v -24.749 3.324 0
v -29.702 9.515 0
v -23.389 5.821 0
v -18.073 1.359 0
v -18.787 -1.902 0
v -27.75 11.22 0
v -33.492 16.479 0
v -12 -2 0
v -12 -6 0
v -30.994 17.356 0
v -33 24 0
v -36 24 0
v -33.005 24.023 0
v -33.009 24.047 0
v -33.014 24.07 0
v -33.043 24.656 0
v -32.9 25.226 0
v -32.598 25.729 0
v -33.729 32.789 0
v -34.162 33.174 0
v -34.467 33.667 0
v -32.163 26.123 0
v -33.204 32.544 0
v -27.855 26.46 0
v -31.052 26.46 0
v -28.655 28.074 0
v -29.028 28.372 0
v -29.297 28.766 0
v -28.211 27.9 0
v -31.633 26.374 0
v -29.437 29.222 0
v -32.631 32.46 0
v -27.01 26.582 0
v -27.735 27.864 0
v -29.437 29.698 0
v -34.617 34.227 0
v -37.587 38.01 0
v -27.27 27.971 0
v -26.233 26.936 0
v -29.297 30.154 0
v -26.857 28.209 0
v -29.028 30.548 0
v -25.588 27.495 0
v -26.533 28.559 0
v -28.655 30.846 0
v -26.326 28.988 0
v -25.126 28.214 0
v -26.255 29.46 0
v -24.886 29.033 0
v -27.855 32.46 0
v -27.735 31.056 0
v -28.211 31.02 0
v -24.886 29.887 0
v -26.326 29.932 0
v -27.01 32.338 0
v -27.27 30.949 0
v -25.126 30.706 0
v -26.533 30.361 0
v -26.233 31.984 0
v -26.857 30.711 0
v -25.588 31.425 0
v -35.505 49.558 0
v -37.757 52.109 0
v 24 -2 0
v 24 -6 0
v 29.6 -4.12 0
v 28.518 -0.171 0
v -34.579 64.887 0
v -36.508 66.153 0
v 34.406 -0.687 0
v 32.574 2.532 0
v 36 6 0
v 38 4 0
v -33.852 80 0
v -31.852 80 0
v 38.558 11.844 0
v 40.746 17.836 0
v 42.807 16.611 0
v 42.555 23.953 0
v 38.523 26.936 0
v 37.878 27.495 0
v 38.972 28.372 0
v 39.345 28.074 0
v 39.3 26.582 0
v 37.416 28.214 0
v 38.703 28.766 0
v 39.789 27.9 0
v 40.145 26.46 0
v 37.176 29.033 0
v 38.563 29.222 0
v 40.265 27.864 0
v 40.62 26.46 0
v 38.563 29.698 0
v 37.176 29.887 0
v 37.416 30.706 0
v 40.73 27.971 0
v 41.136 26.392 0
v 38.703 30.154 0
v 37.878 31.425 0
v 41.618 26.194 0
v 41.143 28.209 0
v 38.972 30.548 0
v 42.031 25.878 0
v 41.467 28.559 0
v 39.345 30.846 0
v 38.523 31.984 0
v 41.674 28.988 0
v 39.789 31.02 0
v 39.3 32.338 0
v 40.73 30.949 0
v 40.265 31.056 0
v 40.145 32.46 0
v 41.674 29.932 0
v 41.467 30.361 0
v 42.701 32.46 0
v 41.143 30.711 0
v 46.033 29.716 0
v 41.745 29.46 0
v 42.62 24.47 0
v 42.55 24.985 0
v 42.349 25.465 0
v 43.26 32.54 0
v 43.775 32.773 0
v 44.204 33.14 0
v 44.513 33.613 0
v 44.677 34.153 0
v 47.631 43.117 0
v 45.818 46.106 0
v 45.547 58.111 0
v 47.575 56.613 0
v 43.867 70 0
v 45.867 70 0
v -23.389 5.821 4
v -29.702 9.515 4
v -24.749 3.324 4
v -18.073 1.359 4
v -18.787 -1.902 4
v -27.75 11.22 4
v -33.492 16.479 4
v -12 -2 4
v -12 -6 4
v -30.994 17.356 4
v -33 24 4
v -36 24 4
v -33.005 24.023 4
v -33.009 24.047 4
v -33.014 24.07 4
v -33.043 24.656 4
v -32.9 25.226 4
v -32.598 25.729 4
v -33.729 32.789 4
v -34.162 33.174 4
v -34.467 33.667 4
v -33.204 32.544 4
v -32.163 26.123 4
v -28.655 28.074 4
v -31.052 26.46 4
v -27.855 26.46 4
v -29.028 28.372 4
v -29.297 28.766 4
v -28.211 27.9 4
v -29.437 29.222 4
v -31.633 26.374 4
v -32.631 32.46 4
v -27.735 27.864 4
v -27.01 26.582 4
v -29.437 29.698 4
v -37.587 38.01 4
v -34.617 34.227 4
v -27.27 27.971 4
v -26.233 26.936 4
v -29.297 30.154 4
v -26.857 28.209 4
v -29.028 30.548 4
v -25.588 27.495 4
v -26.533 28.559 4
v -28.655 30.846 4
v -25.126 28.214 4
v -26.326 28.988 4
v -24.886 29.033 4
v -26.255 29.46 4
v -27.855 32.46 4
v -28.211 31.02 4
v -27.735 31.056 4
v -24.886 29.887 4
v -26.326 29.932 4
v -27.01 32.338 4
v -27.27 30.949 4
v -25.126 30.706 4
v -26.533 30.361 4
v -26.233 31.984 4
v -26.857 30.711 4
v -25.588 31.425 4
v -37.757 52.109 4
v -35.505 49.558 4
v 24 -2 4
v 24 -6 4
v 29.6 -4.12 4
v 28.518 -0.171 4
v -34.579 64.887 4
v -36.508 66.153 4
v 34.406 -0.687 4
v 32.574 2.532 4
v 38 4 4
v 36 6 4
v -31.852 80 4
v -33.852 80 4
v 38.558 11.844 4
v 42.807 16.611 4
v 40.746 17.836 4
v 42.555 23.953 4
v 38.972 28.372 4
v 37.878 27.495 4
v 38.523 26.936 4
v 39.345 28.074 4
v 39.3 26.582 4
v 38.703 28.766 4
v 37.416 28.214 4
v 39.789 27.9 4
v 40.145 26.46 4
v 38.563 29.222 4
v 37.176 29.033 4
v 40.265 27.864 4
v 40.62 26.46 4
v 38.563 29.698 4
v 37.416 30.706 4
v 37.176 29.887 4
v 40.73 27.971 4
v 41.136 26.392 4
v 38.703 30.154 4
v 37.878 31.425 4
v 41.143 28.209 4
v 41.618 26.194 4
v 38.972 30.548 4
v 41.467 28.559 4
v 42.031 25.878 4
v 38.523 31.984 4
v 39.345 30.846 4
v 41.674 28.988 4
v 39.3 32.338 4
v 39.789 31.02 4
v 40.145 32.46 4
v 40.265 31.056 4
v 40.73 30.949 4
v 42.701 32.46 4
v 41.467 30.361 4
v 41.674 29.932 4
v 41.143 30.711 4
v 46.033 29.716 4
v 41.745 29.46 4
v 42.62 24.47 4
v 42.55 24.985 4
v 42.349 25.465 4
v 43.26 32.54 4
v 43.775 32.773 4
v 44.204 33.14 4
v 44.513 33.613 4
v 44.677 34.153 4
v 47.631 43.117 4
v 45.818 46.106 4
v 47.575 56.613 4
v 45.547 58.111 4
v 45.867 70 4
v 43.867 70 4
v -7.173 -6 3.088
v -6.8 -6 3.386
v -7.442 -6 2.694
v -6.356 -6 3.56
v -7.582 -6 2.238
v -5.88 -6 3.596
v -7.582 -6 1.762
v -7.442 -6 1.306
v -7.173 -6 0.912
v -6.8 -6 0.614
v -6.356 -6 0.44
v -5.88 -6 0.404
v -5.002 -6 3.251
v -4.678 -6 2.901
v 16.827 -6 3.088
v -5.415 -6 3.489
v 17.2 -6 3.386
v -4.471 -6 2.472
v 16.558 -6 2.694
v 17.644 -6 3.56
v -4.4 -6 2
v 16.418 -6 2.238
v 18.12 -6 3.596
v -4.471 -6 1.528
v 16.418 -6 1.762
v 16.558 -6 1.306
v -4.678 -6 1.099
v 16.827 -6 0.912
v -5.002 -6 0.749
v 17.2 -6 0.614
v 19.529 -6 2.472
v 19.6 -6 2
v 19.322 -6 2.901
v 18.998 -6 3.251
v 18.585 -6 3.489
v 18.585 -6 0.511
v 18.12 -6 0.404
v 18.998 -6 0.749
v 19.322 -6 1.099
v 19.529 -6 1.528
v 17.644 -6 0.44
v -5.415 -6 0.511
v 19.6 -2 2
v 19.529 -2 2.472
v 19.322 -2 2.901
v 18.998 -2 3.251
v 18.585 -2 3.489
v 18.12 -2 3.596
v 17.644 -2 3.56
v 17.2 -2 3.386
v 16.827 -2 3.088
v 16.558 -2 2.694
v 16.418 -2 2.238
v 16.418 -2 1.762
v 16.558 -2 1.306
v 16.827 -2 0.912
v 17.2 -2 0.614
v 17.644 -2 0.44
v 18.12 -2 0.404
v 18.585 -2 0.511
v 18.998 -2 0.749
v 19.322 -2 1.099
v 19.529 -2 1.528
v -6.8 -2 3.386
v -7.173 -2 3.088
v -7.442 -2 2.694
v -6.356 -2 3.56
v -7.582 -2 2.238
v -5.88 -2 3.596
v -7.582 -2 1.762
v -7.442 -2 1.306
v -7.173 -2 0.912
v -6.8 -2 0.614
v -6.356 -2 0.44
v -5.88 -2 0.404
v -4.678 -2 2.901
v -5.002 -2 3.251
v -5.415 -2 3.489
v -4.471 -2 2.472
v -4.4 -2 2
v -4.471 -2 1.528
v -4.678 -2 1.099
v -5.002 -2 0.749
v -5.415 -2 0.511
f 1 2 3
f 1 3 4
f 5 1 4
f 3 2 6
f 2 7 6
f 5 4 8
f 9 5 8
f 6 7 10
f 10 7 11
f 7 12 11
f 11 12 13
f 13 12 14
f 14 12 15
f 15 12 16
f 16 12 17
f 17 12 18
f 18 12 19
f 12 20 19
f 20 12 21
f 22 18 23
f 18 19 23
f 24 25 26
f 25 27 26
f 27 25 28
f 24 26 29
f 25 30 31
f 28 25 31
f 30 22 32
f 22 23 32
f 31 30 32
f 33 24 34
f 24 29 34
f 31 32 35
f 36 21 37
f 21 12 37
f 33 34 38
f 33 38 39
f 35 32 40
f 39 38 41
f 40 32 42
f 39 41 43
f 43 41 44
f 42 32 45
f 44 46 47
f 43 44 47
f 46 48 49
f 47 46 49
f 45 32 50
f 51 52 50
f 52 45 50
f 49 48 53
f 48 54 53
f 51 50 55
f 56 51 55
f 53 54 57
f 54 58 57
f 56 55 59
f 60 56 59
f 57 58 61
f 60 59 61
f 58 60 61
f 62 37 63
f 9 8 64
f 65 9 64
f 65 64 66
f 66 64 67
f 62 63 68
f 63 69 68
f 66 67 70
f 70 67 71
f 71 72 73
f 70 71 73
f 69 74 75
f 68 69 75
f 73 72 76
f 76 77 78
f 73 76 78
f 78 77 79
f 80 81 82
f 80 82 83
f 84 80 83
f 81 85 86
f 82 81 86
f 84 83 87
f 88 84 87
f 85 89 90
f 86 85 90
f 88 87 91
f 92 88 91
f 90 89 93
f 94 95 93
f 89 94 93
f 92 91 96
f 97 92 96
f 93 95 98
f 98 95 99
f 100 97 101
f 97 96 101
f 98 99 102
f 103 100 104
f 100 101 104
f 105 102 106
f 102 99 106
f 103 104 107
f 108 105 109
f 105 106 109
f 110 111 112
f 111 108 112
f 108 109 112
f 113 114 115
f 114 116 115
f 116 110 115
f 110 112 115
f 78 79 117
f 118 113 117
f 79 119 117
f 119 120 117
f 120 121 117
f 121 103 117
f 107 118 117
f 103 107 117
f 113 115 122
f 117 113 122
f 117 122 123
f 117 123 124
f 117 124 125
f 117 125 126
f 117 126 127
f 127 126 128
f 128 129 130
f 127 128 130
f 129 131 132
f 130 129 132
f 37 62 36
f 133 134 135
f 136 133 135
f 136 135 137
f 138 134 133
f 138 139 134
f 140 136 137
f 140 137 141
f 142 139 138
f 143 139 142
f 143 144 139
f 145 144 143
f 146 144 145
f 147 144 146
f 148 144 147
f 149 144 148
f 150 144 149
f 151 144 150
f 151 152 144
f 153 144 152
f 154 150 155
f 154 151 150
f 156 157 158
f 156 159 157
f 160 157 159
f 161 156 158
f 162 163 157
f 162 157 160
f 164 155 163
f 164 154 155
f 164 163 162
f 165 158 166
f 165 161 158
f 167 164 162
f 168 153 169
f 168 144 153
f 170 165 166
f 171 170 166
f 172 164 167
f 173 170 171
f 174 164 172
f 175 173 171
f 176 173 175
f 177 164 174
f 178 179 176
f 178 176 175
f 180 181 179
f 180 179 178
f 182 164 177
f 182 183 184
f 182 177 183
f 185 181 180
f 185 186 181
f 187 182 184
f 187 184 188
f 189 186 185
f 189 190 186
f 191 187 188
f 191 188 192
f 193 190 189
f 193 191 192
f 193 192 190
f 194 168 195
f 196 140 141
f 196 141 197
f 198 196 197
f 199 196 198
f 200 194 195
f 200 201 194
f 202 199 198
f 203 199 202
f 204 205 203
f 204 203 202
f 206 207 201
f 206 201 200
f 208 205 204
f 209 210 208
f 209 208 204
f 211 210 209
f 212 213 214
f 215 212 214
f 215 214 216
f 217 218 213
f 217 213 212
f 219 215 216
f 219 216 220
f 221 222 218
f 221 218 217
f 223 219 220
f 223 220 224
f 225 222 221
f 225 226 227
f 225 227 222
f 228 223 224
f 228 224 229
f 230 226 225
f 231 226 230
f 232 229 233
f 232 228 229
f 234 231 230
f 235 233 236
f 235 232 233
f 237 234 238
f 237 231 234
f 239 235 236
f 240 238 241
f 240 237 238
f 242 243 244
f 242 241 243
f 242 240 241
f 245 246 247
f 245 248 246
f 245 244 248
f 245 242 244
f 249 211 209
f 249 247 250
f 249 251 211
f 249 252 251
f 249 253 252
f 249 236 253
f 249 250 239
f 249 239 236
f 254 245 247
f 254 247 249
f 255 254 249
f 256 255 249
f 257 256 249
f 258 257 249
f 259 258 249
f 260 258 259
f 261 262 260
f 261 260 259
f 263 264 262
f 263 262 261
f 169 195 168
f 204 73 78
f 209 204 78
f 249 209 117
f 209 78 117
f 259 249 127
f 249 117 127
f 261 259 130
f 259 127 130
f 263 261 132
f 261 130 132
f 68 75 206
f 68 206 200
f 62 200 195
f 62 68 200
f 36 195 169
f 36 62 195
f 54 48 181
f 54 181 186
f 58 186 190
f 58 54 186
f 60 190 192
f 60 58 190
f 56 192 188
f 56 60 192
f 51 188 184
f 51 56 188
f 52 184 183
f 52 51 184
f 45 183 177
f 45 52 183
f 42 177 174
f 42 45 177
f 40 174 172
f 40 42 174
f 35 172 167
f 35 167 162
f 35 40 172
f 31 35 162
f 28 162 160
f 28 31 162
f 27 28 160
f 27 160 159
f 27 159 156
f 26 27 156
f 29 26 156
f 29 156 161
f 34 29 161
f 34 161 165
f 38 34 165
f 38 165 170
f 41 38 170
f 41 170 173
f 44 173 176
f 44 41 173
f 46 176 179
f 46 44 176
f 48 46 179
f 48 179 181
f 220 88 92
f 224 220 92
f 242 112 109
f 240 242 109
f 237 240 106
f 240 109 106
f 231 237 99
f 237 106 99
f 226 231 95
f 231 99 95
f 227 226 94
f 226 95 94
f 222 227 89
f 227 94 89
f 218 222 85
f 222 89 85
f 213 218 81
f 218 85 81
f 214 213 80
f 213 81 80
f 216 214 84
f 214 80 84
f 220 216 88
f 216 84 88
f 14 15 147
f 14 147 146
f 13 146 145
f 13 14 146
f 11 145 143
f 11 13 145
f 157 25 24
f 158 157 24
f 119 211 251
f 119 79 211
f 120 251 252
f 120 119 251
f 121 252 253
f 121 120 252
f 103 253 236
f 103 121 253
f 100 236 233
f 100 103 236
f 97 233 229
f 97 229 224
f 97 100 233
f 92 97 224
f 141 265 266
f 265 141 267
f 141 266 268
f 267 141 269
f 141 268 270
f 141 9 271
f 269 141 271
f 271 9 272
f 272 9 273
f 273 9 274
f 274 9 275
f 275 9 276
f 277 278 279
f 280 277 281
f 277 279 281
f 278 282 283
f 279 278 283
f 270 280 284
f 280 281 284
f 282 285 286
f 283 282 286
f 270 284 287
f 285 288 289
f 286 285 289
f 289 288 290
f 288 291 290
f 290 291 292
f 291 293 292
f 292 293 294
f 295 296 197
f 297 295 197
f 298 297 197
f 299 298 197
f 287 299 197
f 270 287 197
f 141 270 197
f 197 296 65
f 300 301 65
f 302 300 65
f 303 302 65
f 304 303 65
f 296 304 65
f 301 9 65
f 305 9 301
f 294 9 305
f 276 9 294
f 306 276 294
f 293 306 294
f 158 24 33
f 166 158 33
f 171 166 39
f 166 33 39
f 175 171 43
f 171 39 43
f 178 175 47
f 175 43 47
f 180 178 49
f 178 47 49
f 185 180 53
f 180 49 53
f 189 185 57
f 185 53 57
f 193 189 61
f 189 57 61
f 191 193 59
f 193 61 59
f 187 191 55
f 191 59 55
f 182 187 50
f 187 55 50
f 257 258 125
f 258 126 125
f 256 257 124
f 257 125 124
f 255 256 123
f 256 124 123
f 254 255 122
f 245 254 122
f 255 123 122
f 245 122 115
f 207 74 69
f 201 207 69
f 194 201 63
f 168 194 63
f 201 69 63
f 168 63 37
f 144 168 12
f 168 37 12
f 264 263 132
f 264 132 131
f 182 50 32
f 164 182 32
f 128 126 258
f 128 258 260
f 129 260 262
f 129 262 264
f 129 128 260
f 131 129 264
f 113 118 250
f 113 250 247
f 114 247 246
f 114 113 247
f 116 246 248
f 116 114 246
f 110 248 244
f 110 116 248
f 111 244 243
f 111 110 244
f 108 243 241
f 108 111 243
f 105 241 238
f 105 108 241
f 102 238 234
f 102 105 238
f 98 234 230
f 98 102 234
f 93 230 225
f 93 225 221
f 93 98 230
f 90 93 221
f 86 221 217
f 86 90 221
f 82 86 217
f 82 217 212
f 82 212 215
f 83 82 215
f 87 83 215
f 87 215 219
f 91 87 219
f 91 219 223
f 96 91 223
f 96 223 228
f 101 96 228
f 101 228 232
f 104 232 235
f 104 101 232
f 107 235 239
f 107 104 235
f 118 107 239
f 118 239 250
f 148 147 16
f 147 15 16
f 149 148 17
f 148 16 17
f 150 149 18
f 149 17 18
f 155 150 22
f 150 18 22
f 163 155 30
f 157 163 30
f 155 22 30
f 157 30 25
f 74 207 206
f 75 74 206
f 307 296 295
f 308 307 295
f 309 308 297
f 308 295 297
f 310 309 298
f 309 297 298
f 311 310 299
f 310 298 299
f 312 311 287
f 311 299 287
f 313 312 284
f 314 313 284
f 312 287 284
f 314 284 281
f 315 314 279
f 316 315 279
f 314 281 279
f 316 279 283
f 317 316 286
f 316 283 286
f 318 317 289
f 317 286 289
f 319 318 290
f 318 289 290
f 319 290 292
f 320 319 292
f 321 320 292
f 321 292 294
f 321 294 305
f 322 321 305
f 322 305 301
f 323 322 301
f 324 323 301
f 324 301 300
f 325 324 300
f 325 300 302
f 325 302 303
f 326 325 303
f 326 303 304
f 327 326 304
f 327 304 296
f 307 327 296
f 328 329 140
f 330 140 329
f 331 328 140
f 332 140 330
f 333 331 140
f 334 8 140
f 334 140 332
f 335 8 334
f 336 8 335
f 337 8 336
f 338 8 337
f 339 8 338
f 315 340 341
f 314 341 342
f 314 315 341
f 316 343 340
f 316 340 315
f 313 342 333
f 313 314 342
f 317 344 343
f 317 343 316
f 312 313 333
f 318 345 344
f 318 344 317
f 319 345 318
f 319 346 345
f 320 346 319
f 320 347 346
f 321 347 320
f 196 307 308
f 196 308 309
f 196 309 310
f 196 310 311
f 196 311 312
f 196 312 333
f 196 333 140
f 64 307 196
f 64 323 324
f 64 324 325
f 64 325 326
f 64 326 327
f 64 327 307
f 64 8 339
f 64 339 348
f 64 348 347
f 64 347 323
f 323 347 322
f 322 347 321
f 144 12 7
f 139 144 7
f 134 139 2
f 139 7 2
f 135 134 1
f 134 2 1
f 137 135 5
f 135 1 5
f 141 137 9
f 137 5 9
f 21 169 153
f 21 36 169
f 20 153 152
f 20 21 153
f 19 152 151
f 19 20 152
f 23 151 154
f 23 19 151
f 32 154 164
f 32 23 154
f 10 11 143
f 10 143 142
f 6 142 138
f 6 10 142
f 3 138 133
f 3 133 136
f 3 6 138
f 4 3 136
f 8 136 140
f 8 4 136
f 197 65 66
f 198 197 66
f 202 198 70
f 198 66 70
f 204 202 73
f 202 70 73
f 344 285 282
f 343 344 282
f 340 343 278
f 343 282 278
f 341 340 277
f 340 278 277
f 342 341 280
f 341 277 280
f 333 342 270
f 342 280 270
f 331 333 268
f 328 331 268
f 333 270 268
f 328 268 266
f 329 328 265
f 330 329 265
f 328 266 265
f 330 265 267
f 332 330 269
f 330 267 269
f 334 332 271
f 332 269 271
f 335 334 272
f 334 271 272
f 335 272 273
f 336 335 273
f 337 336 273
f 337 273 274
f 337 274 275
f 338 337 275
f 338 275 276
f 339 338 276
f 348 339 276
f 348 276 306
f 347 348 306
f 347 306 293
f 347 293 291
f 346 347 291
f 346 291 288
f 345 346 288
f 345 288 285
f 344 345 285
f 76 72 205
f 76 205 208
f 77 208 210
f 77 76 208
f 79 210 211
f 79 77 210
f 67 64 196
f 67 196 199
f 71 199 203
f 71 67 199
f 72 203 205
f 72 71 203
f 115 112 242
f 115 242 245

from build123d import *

# Parameters (mm, degrees)
PAD_DEPTH    = 4
SKETCH001_R  = 1.6
POCKET_DEPTH = 86.001
SKETCH002_R  = 1.6
PAD001_DEPTH = 4
FILLET_R     = 2


with BuildPart() as pocket:
    # Sketch → Pad (new body)
    with BuildSketch(Plane.XY):
        with BuildLine():
            ThreePointArc((24, -6), (32.130235, -2.582329), (38, 4))
            ThreePointArc((38, 4), (47.03758, 36.391617), (45.866557, 70))
            Line((45.866557, 70), (43.866557, 70))
            ThreePointArc((36, 6), (45.123719, 37.362017), (43.866557, 70))
            ThreePointArc((24, -2), (30.615137, 1.077295), (36, 6))
            Line((-12, -2), (24, -2))
            ThreePointArc((-33, 24), (-25.700047, 8.415346), (-12, -2))
            ThreePointArc((-31.852316, 80), (-35.478006, 52.062546), (-33, 24))
            Line((-33.852316, 80), (-31.852316, 80))
            ThreePointArc((-33.852316, 80), (-37.756855, 52.108561), (-36, 24))
            ThreePointArc((-36, 24), (-27.362437, 6.310051), (-12, -6))
            Line((-12, -6), (24, -6))
        make_face()
    extrude(amount=PAD_DEPTH)

    # Sketch001 → Pocket (cut, through all)
    with BuildSketch(Plane.XZ.offset(6)):
        with Locations((-6, 2)):
            Circle(SKETCH001_R)
        with Locations((18, 2)):
            Circle(SKETCH001_R)
    extrude(amount=-POCKET_DEPTH, mode=Mode.SUBTRACT)


with BuildPart() as fillet_body:
    # Sketch002 → Pad001 (new body)
    with BuildSketch(Plane.XY):
        with BuildLine():
            ThreePointArc((-27.855, 26.46), (-24.855, 29.46), (-27.855, 32.46))
            Line((-27.855, 32.46), (-34.855, 32.46))
            Line((-34.855, 32.46), (-34.855, 26.46))
            Line((-34.855, 26.46), (-27.855, 26.46))
        make_face()
        with Locations((-27.855, 29.46)):
            Circle(SKETCH002_R, mode=Mode.SUBTRACT)
        with BuildLine():
            ThreePointArc((40.145, 32.46), (37.145, 29.46), (40.145, 26.46))
            Line((40.145, 26.46), (44.645, 26.46))
            Line((44.645, 32.46), (44.645, 26.46))
            Line((40.145, 32.46), (44.645, 32.46))
        make_face()
        with Locations((40.145, 29.46)):
            Circle(SKETCH002_R, mode=Mode.SUBTRACT)
    extrude(amount=PAD001_DEPTH)

    # Fusion: union Pocket
    add(pocket.part)

    # Fillet
    fillet_edges = [fillet_body.edges().sort_by_distance(p)[0] for p in [
        (-34.397019, 32.46, 2),
        (-33.465486, 26.46, 2),
        (44.39992, 32.46, 2),
        (43.177998, 26.46, 2),
    ]]
    fillet(fillet_edges, radius=FILLET_R)


solid = fillet_body.part
